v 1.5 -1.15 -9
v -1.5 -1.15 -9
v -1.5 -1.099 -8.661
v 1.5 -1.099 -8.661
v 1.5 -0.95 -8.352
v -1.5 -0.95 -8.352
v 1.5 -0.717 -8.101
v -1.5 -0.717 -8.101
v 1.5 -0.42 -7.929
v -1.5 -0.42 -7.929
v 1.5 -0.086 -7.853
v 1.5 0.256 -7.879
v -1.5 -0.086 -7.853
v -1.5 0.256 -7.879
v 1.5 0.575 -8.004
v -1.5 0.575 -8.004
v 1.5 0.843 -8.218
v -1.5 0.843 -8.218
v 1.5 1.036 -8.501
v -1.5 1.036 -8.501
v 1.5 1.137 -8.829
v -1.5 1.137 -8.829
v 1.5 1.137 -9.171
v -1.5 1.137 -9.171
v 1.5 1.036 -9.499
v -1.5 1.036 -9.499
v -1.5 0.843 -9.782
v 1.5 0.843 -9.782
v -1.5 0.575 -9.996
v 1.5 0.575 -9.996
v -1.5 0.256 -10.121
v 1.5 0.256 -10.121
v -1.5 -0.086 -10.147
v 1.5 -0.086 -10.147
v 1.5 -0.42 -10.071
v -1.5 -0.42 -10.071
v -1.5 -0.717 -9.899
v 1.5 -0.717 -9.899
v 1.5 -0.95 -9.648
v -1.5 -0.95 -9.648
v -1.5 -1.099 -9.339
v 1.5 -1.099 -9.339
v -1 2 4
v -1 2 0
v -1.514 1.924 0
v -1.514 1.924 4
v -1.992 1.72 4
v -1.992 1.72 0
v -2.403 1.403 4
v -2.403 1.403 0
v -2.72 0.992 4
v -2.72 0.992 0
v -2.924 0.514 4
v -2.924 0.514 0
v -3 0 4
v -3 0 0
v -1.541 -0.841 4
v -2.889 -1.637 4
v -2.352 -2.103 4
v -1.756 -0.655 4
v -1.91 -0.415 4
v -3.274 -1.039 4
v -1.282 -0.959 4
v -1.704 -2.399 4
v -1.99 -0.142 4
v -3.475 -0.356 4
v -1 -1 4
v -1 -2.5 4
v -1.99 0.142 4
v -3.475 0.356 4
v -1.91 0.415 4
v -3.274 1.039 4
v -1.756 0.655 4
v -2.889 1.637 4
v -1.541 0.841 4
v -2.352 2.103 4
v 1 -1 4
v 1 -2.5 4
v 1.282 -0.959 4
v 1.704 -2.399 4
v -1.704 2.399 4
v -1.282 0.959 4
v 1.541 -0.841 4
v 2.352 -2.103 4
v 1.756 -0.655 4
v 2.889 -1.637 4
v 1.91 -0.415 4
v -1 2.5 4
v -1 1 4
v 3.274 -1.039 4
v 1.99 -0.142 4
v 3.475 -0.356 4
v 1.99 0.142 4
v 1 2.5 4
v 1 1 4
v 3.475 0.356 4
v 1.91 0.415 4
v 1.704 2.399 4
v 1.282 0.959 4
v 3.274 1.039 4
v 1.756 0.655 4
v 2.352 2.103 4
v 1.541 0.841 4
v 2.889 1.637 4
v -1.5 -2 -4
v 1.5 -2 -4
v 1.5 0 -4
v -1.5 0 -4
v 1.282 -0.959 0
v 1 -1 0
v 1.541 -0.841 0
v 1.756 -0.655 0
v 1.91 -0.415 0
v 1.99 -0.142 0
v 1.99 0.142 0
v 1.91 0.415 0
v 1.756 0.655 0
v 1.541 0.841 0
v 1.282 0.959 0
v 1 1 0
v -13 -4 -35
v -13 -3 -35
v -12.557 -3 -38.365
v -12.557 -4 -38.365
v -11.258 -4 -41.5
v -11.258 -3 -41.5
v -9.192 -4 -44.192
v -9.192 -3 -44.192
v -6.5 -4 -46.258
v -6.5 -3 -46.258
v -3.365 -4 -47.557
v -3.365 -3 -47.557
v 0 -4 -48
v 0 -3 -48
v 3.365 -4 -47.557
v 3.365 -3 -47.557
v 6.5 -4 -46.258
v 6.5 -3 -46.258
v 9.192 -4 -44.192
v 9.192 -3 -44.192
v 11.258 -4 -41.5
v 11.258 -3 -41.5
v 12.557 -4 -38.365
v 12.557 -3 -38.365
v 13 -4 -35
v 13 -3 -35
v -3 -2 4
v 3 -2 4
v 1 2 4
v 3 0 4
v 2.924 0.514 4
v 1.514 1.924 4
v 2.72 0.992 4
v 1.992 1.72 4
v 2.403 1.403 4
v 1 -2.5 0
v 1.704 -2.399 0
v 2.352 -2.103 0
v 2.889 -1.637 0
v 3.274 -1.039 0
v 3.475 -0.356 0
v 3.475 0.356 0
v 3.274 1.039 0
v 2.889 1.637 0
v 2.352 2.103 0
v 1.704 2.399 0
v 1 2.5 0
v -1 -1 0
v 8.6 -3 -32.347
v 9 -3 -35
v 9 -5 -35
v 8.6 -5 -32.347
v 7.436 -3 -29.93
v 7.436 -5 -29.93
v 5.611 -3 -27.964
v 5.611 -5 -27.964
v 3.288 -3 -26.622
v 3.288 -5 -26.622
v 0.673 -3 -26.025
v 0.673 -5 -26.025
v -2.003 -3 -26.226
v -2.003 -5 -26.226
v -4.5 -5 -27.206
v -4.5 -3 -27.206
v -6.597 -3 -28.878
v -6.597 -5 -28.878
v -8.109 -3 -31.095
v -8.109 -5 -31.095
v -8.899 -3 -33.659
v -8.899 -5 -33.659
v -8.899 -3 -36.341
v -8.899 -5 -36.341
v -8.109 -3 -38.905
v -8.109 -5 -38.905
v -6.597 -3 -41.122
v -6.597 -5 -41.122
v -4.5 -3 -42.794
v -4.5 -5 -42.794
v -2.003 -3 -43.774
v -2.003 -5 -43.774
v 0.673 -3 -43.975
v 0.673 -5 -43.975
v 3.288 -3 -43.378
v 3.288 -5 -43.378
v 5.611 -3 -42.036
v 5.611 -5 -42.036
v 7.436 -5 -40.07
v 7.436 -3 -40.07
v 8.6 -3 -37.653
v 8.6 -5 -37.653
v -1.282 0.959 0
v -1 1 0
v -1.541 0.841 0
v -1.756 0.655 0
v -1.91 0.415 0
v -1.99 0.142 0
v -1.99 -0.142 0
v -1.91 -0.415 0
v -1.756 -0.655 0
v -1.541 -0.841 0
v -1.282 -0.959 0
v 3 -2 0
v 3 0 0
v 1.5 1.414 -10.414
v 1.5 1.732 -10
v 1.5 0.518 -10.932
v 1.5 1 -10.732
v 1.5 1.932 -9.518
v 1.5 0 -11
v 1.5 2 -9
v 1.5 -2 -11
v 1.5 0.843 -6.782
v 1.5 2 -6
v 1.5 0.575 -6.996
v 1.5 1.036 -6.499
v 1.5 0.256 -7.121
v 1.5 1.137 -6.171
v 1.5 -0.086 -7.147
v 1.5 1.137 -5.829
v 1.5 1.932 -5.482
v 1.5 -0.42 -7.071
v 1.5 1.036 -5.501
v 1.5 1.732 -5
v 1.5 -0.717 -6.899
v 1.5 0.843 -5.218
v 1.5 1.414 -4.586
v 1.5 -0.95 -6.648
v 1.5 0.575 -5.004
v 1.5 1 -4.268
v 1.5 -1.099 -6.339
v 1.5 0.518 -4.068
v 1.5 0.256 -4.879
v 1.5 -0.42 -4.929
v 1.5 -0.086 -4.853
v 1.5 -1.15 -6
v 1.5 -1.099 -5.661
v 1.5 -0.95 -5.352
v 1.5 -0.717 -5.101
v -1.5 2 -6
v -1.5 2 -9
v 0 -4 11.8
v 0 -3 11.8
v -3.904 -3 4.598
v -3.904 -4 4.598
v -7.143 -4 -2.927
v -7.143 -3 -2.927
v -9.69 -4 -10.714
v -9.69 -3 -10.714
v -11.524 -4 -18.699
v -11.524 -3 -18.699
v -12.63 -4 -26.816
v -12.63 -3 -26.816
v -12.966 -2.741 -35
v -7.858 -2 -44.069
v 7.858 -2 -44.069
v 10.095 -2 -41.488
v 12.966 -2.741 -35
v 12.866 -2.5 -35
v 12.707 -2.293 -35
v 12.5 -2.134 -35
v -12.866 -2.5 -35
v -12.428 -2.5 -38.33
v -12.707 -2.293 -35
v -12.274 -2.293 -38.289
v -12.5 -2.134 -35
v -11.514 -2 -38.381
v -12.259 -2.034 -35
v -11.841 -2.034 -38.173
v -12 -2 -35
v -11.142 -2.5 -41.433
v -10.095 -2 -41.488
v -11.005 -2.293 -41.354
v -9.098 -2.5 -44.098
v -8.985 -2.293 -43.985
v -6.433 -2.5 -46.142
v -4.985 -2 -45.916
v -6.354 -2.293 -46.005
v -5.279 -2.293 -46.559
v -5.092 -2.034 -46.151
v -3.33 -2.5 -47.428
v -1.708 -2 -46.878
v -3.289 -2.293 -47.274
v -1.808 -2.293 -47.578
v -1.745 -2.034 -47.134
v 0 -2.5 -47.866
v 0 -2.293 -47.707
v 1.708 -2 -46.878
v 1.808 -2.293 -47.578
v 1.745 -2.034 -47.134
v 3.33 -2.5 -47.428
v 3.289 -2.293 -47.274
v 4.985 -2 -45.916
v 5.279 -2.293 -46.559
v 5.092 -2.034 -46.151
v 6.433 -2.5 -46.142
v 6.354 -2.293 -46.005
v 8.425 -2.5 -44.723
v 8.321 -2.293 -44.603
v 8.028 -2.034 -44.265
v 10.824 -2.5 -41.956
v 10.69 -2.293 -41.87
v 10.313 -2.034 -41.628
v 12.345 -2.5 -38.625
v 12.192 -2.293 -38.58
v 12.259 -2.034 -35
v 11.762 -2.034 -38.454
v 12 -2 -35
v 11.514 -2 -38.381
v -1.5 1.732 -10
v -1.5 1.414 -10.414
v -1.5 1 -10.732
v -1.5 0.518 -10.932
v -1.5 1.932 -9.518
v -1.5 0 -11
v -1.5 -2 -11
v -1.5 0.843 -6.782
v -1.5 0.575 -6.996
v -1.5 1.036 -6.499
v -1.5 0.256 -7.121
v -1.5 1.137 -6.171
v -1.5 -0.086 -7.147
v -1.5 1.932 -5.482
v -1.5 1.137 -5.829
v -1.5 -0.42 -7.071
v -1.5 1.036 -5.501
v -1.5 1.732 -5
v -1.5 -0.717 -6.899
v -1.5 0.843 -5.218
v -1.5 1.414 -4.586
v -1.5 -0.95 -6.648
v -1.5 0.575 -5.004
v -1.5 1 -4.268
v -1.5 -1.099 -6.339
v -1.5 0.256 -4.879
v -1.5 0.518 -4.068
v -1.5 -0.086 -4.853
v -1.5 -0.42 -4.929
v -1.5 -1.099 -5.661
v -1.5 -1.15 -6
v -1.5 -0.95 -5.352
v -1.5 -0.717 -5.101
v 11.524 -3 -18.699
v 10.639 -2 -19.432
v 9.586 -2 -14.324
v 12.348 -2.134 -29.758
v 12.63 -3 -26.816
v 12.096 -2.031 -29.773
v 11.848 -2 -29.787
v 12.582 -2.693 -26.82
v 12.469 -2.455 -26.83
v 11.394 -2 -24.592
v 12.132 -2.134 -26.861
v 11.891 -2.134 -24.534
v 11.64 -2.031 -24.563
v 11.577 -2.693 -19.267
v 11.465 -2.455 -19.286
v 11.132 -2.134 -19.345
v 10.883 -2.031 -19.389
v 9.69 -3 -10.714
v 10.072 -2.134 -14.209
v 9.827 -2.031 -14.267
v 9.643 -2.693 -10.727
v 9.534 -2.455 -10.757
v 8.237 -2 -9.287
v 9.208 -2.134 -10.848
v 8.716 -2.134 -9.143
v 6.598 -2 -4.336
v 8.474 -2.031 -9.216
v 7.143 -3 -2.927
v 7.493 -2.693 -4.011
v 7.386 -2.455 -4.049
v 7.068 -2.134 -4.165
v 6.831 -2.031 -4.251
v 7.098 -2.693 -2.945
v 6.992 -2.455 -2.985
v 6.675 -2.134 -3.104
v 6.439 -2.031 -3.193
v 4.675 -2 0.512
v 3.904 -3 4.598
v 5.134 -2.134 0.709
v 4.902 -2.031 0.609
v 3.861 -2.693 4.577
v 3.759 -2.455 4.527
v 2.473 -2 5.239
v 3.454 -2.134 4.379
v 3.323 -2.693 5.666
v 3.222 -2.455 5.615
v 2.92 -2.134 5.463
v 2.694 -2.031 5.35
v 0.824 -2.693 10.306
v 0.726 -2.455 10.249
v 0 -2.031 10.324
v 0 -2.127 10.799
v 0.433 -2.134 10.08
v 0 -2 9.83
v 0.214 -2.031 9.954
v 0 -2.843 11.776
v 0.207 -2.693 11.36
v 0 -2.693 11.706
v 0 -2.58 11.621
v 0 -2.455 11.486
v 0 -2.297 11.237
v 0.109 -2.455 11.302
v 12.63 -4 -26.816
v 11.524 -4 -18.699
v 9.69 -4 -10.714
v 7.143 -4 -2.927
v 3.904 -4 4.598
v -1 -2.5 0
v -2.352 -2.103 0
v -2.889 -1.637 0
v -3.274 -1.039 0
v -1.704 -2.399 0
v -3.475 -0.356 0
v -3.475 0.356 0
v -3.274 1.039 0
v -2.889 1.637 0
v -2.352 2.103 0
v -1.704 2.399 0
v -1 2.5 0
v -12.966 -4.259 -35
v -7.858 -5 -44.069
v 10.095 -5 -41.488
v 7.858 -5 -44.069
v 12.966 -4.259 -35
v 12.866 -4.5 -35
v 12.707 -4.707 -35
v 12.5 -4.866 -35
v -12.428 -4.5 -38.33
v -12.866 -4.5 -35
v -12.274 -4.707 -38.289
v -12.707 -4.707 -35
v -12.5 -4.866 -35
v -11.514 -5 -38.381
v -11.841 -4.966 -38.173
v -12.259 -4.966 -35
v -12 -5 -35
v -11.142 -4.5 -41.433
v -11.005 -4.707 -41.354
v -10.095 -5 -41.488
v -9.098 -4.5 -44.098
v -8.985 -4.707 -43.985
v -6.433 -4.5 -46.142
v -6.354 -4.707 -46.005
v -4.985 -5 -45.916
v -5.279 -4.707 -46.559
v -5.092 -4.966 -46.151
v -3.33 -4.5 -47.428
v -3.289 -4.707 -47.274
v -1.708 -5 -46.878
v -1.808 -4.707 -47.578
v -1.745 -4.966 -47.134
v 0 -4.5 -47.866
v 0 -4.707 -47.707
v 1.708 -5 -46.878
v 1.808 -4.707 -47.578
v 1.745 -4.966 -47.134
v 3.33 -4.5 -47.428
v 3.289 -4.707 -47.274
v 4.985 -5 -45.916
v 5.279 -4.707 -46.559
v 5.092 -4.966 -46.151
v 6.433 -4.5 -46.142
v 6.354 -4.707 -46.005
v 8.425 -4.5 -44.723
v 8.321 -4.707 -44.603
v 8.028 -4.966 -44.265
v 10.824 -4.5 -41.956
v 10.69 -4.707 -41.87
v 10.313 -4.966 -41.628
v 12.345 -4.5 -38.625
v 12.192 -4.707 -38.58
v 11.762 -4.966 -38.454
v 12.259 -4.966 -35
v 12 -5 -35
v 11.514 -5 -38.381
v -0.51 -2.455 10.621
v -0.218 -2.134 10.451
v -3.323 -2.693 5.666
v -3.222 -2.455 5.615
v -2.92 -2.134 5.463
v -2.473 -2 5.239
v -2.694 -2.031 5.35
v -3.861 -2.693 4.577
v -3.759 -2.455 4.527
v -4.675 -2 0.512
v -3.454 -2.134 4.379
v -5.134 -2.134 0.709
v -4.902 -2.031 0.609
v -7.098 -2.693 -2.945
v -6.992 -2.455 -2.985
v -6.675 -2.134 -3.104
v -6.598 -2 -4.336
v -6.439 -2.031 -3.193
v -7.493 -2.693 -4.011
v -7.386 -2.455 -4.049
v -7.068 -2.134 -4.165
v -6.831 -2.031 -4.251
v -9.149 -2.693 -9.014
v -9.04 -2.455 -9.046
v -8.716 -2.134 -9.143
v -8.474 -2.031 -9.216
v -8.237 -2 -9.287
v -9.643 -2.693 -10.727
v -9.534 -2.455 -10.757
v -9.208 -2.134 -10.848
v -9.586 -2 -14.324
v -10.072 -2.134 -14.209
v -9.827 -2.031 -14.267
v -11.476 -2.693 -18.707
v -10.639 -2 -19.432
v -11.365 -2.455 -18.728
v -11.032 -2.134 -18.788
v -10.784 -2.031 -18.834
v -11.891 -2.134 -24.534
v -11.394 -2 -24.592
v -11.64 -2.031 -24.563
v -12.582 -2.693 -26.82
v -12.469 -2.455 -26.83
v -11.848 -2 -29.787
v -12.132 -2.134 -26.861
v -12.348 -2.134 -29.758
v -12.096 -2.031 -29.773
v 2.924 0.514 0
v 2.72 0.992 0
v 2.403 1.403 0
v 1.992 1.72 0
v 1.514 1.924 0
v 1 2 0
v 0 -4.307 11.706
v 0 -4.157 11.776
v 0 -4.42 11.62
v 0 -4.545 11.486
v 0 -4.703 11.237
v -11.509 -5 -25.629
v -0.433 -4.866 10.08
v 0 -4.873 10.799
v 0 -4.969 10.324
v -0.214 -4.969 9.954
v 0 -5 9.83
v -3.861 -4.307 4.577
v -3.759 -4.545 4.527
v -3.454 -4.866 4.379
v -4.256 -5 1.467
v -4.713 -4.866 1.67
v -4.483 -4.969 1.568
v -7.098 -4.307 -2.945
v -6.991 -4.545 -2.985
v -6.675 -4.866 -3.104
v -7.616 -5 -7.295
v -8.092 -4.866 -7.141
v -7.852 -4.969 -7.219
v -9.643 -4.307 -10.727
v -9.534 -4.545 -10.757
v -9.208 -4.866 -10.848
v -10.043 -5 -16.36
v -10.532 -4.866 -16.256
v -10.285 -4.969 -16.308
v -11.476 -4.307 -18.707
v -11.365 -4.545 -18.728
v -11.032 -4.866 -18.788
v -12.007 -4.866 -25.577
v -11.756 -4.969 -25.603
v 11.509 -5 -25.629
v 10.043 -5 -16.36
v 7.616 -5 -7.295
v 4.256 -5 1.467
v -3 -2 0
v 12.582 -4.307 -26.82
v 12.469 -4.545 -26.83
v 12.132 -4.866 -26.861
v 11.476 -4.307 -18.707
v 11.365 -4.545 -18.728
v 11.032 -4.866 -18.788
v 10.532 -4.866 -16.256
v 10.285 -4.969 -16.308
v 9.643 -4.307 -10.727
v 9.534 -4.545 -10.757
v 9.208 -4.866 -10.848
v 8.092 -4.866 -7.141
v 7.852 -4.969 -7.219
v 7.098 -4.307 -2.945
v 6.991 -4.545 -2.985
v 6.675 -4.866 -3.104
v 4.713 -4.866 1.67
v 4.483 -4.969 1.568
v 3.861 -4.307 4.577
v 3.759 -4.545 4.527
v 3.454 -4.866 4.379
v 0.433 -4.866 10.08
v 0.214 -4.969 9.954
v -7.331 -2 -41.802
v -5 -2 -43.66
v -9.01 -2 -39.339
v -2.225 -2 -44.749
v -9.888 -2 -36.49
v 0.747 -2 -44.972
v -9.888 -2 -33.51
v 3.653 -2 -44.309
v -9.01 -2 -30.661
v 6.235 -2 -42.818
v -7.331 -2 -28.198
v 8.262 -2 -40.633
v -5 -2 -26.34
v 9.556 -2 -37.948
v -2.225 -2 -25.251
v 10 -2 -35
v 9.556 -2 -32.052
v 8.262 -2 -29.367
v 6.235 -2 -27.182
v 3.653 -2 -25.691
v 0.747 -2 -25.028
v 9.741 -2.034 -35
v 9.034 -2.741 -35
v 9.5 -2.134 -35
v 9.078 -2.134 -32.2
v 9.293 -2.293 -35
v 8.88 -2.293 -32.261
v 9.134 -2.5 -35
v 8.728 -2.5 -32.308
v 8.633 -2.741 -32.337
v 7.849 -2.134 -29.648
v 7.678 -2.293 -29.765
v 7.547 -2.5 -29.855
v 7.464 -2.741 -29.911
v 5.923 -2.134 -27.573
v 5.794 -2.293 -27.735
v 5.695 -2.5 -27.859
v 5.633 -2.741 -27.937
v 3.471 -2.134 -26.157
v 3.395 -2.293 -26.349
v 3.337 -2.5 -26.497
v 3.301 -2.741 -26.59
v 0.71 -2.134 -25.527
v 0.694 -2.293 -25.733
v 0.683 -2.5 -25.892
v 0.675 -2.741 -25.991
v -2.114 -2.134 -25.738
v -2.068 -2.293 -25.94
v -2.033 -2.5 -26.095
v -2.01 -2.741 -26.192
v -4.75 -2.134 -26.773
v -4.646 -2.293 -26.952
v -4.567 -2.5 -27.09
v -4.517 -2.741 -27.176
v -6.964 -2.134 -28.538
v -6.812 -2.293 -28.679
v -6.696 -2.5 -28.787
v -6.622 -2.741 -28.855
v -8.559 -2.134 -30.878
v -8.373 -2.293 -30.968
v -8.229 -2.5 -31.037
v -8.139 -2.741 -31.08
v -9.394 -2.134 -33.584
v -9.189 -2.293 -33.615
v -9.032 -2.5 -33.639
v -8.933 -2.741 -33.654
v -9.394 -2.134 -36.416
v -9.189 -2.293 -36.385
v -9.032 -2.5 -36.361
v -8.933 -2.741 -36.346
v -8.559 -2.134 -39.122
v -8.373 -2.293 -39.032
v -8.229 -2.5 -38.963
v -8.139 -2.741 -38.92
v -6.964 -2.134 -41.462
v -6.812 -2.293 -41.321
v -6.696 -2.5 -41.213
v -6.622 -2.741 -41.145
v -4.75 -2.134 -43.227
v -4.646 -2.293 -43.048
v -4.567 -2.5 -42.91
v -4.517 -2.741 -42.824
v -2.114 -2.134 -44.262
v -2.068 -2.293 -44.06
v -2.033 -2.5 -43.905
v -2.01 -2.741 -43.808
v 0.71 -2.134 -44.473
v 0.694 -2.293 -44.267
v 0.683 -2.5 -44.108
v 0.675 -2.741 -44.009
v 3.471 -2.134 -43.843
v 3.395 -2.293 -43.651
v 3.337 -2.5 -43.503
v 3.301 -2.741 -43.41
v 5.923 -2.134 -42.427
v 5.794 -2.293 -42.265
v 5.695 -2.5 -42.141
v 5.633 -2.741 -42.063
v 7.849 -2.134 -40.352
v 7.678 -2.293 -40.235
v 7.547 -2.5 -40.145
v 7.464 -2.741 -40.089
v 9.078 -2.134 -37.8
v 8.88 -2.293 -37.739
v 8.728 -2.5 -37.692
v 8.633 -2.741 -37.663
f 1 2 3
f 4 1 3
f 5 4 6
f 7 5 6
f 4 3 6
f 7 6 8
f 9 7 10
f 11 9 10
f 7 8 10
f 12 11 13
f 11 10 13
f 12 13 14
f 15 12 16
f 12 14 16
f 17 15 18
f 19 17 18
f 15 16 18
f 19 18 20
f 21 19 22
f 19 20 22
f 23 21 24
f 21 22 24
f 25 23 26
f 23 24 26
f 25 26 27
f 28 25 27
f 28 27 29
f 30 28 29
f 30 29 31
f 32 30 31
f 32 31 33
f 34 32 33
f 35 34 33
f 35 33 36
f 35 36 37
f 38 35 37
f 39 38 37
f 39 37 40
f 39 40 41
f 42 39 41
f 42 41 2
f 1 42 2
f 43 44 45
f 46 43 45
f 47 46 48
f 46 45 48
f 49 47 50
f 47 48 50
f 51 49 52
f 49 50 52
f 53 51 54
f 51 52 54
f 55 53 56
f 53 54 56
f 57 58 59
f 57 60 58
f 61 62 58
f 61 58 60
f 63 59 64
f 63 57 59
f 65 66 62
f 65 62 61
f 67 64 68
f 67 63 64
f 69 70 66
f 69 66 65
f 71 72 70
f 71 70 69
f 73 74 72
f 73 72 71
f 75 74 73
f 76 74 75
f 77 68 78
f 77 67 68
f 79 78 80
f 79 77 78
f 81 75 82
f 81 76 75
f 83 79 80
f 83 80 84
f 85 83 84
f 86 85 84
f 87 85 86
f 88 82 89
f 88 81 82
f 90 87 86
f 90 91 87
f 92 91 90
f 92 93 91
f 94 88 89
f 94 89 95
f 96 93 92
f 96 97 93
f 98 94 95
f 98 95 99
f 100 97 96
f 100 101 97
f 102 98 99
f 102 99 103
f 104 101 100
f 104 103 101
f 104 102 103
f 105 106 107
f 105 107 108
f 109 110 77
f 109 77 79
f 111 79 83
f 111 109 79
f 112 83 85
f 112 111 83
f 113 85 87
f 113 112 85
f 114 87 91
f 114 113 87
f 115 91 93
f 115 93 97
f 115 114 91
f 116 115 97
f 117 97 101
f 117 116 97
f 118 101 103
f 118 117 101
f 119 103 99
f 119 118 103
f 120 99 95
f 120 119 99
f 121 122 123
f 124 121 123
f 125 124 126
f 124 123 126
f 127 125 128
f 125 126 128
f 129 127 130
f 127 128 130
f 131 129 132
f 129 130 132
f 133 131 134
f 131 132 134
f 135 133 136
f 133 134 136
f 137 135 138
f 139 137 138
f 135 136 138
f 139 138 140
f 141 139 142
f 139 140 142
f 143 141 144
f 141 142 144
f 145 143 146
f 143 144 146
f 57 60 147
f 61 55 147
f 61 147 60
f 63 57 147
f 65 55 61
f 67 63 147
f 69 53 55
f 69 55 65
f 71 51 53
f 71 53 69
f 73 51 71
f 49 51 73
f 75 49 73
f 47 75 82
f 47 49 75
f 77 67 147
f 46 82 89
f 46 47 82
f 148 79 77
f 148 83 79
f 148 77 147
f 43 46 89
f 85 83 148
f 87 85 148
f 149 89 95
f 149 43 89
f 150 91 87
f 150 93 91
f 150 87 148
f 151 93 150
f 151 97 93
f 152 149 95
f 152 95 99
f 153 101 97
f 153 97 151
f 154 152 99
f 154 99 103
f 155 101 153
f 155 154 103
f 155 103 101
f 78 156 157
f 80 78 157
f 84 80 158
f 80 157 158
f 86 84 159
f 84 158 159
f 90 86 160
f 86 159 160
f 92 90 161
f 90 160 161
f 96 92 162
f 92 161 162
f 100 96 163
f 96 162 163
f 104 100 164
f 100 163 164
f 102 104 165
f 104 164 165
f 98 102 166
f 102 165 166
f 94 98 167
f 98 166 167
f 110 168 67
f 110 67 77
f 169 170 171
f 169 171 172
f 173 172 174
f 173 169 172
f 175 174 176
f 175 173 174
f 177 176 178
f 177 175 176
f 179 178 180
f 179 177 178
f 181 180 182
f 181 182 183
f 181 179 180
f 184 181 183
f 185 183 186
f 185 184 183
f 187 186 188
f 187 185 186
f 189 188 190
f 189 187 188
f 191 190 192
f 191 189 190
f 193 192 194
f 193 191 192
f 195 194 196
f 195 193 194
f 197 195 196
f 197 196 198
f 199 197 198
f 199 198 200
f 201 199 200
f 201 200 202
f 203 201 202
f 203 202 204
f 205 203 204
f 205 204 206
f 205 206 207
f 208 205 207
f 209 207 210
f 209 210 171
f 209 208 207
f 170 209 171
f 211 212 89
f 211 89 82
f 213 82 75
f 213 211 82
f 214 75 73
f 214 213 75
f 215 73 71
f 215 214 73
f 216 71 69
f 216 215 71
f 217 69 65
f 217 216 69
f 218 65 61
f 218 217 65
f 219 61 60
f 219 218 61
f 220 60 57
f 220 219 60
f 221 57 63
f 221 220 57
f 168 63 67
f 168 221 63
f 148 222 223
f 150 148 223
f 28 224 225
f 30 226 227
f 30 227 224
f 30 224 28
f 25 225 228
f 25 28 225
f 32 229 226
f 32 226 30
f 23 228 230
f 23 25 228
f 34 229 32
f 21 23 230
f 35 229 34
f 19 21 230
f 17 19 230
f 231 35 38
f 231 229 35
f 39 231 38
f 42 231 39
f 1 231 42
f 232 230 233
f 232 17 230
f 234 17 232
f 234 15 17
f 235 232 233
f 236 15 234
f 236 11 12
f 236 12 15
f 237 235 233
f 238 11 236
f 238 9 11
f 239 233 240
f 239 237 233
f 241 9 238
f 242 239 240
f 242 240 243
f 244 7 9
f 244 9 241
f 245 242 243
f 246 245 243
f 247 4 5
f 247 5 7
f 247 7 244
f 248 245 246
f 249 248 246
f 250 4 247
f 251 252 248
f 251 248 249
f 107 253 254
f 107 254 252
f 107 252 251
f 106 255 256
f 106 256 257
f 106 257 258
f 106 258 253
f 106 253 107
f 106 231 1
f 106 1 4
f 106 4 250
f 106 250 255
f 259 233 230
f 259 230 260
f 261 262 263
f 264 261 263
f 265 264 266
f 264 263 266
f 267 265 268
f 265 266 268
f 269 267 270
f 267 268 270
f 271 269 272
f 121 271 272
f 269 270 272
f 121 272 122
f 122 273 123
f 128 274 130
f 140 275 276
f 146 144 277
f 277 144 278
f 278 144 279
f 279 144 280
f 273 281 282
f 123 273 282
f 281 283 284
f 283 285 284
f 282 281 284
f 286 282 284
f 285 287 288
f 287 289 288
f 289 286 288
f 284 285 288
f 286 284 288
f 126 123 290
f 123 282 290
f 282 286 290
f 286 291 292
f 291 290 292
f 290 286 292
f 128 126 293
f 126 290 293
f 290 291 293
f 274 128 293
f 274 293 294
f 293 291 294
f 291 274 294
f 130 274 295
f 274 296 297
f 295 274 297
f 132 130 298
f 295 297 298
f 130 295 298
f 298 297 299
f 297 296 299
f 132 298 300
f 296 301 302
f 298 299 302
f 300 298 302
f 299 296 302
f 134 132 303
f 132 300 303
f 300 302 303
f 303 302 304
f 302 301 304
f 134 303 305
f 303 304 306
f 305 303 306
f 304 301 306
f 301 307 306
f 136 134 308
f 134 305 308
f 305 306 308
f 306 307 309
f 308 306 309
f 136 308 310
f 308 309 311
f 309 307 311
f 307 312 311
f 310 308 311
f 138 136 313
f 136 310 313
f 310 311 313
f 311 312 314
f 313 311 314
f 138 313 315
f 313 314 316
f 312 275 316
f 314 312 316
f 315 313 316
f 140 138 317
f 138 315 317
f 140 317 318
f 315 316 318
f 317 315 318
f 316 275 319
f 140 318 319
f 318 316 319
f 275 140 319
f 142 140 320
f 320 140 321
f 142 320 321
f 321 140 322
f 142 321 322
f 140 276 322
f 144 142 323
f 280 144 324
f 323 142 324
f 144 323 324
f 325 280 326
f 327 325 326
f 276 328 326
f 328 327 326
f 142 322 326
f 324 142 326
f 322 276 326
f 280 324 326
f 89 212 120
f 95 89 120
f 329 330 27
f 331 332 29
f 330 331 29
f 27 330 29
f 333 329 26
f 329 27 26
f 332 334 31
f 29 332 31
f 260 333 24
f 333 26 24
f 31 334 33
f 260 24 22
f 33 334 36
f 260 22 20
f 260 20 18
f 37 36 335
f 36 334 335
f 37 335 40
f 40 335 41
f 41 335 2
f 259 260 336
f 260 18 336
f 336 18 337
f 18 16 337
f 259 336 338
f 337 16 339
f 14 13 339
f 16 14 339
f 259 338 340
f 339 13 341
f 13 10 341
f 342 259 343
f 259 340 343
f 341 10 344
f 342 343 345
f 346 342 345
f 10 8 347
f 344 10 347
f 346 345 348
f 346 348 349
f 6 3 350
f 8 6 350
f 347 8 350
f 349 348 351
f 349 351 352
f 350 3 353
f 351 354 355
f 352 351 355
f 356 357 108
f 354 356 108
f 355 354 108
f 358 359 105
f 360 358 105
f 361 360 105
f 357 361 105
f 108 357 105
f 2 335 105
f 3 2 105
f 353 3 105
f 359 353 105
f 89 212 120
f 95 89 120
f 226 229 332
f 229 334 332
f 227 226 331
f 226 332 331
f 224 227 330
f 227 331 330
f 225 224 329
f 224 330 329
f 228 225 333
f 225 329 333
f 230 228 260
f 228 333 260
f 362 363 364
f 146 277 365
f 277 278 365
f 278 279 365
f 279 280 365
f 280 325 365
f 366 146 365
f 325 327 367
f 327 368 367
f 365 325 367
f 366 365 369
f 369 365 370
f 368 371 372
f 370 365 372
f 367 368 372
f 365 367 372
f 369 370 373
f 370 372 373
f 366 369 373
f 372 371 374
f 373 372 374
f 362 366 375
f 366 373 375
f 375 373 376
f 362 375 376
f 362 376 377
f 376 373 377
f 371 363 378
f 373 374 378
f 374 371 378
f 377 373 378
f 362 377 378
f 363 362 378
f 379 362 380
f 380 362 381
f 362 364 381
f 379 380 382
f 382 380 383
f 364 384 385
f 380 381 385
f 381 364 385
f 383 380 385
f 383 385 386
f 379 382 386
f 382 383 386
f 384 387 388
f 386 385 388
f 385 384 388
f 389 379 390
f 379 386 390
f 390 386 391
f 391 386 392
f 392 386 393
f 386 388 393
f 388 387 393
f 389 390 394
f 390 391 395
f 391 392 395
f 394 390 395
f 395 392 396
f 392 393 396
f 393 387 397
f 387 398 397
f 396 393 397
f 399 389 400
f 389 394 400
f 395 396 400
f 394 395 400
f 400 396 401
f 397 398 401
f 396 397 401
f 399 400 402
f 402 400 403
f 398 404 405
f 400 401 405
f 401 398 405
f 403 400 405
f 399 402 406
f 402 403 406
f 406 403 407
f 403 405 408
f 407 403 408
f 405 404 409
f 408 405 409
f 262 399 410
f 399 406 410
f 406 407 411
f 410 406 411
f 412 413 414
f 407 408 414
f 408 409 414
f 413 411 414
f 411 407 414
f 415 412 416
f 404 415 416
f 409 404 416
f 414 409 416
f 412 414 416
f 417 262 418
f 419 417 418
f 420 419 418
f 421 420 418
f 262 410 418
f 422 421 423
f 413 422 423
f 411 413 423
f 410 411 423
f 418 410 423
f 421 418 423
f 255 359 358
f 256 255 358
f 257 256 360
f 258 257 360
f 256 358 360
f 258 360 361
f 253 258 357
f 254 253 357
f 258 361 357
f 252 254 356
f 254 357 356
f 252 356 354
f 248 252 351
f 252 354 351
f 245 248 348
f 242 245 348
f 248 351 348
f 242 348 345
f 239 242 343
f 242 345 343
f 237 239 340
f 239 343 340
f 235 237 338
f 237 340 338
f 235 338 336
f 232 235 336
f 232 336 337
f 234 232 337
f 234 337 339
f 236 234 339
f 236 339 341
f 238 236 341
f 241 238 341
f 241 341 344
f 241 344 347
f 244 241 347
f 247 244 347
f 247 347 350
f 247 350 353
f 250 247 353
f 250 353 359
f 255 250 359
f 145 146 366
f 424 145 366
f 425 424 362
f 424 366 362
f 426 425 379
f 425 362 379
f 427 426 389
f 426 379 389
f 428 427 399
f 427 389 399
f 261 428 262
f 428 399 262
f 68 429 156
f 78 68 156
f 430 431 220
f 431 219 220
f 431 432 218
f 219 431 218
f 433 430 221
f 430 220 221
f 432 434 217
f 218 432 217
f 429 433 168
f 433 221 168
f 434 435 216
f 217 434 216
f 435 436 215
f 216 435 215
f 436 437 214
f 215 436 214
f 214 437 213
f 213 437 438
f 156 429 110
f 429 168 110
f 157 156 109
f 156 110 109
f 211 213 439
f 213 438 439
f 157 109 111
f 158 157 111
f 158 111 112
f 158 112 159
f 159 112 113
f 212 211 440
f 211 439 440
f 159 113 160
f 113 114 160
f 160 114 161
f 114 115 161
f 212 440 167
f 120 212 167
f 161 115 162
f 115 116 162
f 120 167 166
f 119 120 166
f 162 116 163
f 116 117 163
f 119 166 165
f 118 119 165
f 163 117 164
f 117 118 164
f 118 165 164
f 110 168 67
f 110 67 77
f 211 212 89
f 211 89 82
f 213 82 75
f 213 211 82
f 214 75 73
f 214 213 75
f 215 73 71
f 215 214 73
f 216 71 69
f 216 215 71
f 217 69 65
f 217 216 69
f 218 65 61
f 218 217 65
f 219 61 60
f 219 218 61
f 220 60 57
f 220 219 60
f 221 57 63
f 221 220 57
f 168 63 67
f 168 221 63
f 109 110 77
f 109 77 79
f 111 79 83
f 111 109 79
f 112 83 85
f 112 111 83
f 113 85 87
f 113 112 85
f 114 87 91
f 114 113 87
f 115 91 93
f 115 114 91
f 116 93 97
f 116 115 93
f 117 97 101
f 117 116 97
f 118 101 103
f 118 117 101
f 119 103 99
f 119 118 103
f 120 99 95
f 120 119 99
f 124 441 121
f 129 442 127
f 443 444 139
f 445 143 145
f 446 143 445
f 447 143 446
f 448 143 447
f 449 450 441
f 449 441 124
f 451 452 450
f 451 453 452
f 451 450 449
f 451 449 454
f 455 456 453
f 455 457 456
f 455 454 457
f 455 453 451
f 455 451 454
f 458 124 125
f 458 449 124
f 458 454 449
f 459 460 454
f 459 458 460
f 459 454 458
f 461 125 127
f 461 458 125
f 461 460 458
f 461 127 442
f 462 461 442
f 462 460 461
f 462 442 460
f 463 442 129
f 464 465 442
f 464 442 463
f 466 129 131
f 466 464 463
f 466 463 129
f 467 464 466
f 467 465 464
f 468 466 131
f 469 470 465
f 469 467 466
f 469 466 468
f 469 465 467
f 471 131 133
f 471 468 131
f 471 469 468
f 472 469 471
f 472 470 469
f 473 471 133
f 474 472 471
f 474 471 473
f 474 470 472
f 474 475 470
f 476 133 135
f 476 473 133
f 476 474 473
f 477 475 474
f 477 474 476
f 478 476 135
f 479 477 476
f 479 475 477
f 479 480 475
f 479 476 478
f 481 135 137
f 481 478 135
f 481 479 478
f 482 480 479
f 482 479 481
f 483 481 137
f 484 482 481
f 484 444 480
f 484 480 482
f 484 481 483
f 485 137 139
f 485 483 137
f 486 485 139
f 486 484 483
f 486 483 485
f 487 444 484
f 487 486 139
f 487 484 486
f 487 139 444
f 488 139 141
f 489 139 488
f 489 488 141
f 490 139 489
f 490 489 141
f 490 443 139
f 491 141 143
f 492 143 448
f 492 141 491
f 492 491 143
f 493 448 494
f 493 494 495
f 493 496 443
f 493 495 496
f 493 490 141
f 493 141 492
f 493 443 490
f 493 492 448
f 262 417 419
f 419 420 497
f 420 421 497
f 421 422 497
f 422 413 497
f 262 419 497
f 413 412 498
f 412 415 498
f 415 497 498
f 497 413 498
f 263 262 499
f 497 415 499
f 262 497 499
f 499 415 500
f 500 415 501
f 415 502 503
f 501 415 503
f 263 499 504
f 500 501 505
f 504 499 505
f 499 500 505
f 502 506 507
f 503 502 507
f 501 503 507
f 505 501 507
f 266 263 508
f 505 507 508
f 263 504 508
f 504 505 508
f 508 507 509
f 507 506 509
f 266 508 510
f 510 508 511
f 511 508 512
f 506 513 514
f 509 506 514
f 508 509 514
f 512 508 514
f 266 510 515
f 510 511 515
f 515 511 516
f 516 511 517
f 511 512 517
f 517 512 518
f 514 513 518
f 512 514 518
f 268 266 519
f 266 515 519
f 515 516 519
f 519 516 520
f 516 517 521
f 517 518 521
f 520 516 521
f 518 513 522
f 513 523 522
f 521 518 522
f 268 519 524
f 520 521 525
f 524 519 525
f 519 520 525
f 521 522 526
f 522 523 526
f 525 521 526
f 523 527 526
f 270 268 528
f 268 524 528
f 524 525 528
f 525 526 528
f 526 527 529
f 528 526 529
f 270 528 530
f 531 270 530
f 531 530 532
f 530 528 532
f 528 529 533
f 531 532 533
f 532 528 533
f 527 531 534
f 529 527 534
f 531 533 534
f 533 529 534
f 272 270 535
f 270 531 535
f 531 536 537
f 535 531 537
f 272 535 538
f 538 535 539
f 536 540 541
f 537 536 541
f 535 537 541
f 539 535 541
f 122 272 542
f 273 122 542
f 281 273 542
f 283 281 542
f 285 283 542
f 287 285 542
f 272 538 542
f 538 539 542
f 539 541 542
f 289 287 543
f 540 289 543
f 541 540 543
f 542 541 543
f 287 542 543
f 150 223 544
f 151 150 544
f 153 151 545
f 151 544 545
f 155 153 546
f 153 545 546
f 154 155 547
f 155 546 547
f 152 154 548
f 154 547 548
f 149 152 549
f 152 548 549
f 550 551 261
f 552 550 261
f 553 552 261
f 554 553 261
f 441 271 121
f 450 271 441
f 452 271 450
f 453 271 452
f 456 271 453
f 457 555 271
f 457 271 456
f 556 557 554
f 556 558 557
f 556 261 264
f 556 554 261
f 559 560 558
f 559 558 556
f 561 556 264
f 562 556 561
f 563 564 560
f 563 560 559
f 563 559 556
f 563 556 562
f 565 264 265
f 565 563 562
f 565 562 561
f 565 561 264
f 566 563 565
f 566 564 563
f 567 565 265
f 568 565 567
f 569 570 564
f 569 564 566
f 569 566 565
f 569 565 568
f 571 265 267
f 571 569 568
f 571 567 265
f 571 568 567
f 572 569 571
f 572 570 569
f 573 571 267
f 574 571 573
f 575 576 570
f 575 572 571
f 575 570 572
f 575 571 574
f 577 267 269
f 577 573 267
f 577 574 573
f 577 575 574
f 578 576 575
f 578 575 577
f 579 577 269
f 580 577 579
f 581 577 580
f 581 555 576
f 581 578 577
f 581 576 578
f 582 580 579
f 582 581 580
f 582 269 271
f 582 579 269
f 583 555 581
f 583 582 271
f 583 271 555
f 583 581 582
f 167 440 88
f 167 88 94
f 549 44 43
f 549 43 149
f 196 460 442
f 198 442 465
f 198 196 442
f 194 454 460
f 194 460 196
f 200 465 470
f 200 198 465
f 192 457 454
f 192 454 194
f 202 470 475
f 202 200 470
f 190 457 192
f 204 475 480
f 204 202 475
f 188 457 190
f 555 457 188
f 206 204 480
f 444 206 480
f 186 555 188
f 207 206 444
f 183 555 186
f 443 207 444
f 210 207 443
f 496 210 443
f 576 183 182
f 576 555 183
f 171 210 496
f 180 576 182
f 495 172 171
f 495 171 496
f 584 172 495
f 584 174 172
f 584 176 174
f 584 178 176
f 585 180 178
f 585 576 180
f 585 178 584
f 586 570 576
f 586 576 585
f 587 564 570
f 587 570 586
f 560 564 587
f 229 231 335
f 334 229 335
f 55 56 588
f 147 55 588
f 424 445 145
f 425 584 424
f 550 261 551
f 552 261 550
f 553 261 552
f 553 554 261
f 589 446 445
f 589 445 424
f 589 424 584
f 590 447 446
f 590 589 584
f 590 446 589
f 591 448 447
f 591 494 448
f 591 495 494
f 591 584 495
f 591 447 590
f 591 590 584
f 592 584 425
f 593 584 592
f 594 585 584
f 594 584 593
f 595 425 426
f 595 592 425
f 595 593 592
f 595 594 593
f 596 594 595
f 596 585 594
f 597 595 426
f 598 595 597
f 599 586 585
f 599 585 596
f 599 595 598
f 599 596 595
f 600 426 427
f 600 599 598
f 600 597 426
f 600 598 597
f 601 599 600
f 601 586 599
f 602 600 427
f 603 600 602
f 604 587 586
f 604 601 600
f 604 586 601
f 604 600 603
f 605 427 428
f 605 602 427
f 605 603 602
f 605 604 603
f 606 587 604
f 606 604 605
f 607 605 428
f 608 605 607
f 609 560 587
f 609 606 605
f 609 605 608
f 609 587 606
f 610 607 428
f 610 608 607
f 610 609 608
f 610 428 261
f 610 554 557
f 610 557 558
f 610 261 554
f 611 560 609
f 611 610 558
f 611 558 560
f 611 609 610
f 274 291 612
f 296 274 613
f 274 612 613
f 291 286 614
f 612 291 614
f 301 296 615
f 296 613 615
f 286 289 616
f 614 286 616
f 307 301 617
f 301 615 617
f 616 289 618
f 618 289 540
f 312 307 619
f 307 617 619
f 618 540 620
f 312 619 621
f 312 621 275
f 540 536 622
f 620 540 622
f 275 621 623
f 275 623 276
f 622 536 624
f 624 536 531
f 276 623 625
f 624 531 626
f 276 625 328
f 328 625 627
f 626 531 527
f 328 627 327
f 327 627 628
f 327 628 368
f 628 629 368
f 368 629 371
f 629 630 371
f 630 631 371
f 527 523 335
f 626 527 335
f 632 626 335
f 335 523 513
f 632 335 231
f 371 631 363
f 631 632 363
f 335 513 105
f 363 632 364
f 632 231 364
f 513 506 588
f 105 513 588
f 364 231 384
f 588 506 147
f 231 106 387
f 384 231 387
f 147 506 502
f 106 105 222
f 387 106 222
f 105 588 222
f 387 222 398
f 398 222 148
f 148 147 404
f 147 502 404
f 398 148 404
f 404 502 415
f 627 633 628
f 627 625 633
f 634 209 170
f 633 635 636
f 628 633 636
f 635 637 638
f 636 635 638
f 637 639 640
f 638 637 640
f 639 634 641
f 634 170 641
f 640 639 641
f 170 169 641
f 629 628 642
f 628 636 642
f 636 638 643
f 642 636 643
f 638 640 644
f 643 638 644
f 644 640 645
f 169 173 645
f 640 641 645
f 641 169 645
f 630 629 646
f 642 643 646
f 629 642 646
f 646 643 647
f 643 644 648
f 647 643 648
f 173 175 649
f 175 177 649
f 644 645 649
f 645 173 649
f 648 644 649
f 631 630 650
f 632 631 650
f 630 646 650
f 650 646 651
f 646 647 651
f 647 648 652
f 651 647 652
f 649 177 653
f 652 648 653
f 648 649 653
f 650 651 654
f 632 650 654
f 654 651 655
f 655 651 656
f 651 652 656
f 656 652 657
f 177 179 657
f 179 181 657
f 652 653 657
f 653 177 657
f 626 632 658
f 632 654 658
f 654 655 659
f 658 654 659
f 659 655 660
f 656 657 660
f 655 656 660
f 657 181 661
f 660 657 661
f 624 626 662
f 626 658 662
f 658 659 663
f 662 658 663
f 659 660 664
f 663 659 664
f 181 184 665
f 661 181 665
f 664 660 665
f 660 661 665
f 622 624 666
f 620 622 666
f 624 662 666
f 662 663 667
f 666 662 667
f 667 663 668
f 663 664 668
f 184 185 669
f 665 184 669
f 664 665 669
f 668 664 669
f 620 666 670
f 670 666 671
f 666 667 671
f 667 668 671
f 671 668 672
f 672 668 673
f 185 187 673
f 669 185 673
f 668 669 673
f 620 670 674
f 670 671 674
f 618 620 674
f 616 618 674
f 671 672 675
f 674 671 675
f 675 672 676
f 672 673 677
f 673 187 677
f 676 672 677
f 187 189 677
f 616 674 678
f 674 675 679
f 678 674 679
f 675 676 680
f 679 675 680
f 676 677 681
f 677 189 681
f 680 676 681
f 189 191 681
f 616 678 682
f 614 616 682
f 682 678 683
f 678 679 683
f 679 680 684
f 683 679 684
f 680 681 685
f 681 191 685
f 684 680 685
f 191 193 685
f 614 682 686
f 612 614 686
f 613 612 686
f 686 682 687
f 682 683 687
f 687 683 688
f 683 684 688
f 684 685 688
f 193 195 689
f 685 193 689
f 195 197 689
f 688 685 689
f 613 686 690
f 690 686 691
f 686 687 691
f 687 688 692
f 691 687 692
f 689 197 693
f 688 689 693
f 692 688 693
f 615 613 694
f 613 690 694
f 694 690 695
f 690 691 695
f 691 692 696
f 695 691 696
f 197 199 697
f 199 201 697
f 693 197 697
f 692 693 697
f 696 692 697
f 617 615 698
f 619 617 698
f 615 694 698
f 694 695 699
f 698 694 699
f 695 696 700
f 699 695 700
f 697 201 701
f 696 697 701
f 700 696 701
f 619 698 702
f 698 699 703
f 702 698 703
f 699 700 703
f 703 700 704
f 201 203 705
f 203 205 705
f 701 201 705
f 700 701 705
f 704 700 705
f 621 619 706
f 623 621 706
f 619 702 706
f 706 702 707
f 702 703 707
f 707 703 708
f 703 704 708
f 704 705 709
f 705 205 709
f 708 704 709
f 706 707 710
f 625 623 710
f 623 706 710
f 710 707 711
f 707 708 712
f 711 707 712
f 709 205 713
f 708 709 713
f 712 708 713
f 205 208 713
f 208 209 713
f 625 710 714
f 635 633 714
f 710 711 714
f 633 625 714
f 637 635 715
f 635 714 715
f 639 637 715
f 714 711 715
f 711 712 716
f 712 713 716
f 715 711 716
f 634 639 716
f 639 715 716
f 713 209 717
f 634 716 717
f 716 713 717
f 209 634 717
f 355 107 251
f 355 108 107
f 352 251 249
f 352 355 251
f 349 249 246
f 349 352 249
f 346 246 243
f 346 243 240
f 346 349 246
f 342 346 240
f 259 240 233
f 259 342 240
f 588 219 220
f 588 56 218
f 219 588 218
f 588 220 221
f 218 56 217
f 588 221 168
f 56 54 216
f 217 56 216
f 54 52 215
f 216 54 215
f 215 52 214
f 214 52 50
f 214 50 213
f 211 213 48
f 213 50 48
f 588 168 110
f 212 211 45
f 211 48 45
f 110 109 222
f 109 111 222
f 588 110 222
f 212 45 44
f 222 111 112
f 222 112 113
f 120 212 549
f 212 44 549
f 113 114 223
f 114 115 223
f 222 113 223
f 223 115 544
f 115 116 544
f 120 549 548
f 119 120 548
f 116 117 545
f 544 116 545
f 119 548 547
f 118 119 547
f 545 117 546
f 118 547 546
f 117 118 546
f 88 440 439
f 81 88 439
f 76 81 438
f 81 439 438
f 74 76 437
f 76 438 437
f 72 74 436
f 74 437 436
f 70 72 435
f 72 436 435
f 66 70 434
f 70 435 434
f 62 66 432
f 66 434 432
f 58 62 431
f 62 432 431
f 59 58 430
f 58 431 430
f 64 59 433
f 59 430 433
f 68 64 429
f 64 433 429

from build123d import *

# Parameters (mm, degrees)
PAD_DEPTH    = 4
PAD001_DEPTH = 4
SKETCH002_R  = 9
PAD002_DEPTH = 3
SKETCH005_W  = 3
SKETCH005_H  = 7
PAD003_DEPTH = 4
FILLET_R     = 1
FILLET001_R  = 2
SKETCH004_R  = 1.15
POCKET_DEPTH = 5


with BuildPart() as squeezebody:
    # Sketch → Pad (new body)
    with BuildSketch(Plane.XY):
        with BuildLine():
            ThreePointArc((-1, 2.5), (-3.5, 0), (-1, -2.5))
            Line((-1, -2.5), (1, -2.5))
            ThreePointArc((1, -2.5), (3.499999, 0), (1, 2.5))
            Line((-1, 2.5), (1, 2.5))
        make_face()
        with BuildLine():
            ThreePointArc((-1, 1), (-2, 0), (-1, -1))
            Line((-1, -1), (0.999999, -1))
            ThreePointArc((0.999999, -1), (1.999999, 0), (1, 1))
            Line((-1, 1), (1, 1))
        make_face(mode=Mode.SUBTRACT)
    extrude(amount=PAD_DEPTH)


with BuildPart() as endinsultaorbody:
    # Sketch001 → Pad001 (new body)
    with BuildSketch(Plane.XY):
        with BuildLine():
            ThreePointArc((-1, 2), (-2.402883, 1.402883), (-3, 0))
            Line((-3, 0), (-3, -2))
            Line((-3, -2), (3, -2))
            Line((3, -2), (3, 0))
            ThreePointArc((3, 0), (2.402883, 1.402883), (1, 2))
            Line((-1, 2), (1, 2))
        make_face()
        with BuildLine():
            ThreePointArc((-1, 1), (-2, 0), (-1, -1))
            Line((-1, -1), (0.999999, -1))
            ThreePointArc((0.999999, -1), (2, 0), (1, 1))
            Line((-1, 1), (1, 1))
        make_face(mode=Mode.SUBTRACT)
    extrude(amount=PAD001_DEPTH)

    # Sketch002 → Pad002 (join)
    with BuildSketch(Plane.XZ.offset(2)):
        with BuildLine():
            ThreePointArc((-13, -35), (0, -48), (13, -35))
            ThreePointArc((13, -35), (9.689615, -10.713996), (0, 11.8))
            ThreePointArc((0, 11.8), (-9.689615, -10.713996), (-13, -35))
        make_face()
        with Locations((0, -35)):
            Circle(SKETCH002_R, mode=Mode.SUBTRACT)
    extrude(amount=PAD002_DEPTH)

    # Sketch005 (on Face4 of Pad002) → Pad003 (join)
    with BuildSketch(Plane(origin=(0, -2, 0), x_dir=(-1, 0, 0), z_dir=(0, 1, 0))):
        with Locations((0, -7.5)):
            Rectangle(SKETCH005_W, SKETCH005_H)
    extrude(amount=PAD003_DEPTH)

    # Fillet
    fillet_edges = [endinsultaorbody.edges().sort_by_distance(p)[0] for p in [
        (-9.689615, -2, -10.713996),
        (9.689615, -2, -10.713996),
        (0, -2, -48),
        (-9, -2, -35),
        (9.689615, -5, -10.713996),
        (0, -5, -48),
        (-9.689615, -5, -10.713996),
    ]]
    fillet(fillet_edges, radius=FILLET_R)

    # Fillet001
    fillet001_edges = [endinsultaorbody.edges().sort_by_distance(p)[0] for p in [
        (0, 2, -11),
        (0, 2, -4),
    ]]
    fillet(fillet001_edges, radius=FILLET001_R)

    # Sketch004 → Pocket (cut)
    with BuildSketch(Plane(origin=(-1.5, 0, 0), x_dir=(0, -1, 0), z_dir=(-1, 0, 0))):
        with Locations((0, -6)):
            Circle(SKETCH004_R)
        with Locations((0, -9)):
            Circle(SKETCH004_R)
    extrude(amount=-POCKET_DEPTH, mode=Mode.SUBTRACT)


solid = Compound([squeezebody.part, endinsultaorbody.part])
